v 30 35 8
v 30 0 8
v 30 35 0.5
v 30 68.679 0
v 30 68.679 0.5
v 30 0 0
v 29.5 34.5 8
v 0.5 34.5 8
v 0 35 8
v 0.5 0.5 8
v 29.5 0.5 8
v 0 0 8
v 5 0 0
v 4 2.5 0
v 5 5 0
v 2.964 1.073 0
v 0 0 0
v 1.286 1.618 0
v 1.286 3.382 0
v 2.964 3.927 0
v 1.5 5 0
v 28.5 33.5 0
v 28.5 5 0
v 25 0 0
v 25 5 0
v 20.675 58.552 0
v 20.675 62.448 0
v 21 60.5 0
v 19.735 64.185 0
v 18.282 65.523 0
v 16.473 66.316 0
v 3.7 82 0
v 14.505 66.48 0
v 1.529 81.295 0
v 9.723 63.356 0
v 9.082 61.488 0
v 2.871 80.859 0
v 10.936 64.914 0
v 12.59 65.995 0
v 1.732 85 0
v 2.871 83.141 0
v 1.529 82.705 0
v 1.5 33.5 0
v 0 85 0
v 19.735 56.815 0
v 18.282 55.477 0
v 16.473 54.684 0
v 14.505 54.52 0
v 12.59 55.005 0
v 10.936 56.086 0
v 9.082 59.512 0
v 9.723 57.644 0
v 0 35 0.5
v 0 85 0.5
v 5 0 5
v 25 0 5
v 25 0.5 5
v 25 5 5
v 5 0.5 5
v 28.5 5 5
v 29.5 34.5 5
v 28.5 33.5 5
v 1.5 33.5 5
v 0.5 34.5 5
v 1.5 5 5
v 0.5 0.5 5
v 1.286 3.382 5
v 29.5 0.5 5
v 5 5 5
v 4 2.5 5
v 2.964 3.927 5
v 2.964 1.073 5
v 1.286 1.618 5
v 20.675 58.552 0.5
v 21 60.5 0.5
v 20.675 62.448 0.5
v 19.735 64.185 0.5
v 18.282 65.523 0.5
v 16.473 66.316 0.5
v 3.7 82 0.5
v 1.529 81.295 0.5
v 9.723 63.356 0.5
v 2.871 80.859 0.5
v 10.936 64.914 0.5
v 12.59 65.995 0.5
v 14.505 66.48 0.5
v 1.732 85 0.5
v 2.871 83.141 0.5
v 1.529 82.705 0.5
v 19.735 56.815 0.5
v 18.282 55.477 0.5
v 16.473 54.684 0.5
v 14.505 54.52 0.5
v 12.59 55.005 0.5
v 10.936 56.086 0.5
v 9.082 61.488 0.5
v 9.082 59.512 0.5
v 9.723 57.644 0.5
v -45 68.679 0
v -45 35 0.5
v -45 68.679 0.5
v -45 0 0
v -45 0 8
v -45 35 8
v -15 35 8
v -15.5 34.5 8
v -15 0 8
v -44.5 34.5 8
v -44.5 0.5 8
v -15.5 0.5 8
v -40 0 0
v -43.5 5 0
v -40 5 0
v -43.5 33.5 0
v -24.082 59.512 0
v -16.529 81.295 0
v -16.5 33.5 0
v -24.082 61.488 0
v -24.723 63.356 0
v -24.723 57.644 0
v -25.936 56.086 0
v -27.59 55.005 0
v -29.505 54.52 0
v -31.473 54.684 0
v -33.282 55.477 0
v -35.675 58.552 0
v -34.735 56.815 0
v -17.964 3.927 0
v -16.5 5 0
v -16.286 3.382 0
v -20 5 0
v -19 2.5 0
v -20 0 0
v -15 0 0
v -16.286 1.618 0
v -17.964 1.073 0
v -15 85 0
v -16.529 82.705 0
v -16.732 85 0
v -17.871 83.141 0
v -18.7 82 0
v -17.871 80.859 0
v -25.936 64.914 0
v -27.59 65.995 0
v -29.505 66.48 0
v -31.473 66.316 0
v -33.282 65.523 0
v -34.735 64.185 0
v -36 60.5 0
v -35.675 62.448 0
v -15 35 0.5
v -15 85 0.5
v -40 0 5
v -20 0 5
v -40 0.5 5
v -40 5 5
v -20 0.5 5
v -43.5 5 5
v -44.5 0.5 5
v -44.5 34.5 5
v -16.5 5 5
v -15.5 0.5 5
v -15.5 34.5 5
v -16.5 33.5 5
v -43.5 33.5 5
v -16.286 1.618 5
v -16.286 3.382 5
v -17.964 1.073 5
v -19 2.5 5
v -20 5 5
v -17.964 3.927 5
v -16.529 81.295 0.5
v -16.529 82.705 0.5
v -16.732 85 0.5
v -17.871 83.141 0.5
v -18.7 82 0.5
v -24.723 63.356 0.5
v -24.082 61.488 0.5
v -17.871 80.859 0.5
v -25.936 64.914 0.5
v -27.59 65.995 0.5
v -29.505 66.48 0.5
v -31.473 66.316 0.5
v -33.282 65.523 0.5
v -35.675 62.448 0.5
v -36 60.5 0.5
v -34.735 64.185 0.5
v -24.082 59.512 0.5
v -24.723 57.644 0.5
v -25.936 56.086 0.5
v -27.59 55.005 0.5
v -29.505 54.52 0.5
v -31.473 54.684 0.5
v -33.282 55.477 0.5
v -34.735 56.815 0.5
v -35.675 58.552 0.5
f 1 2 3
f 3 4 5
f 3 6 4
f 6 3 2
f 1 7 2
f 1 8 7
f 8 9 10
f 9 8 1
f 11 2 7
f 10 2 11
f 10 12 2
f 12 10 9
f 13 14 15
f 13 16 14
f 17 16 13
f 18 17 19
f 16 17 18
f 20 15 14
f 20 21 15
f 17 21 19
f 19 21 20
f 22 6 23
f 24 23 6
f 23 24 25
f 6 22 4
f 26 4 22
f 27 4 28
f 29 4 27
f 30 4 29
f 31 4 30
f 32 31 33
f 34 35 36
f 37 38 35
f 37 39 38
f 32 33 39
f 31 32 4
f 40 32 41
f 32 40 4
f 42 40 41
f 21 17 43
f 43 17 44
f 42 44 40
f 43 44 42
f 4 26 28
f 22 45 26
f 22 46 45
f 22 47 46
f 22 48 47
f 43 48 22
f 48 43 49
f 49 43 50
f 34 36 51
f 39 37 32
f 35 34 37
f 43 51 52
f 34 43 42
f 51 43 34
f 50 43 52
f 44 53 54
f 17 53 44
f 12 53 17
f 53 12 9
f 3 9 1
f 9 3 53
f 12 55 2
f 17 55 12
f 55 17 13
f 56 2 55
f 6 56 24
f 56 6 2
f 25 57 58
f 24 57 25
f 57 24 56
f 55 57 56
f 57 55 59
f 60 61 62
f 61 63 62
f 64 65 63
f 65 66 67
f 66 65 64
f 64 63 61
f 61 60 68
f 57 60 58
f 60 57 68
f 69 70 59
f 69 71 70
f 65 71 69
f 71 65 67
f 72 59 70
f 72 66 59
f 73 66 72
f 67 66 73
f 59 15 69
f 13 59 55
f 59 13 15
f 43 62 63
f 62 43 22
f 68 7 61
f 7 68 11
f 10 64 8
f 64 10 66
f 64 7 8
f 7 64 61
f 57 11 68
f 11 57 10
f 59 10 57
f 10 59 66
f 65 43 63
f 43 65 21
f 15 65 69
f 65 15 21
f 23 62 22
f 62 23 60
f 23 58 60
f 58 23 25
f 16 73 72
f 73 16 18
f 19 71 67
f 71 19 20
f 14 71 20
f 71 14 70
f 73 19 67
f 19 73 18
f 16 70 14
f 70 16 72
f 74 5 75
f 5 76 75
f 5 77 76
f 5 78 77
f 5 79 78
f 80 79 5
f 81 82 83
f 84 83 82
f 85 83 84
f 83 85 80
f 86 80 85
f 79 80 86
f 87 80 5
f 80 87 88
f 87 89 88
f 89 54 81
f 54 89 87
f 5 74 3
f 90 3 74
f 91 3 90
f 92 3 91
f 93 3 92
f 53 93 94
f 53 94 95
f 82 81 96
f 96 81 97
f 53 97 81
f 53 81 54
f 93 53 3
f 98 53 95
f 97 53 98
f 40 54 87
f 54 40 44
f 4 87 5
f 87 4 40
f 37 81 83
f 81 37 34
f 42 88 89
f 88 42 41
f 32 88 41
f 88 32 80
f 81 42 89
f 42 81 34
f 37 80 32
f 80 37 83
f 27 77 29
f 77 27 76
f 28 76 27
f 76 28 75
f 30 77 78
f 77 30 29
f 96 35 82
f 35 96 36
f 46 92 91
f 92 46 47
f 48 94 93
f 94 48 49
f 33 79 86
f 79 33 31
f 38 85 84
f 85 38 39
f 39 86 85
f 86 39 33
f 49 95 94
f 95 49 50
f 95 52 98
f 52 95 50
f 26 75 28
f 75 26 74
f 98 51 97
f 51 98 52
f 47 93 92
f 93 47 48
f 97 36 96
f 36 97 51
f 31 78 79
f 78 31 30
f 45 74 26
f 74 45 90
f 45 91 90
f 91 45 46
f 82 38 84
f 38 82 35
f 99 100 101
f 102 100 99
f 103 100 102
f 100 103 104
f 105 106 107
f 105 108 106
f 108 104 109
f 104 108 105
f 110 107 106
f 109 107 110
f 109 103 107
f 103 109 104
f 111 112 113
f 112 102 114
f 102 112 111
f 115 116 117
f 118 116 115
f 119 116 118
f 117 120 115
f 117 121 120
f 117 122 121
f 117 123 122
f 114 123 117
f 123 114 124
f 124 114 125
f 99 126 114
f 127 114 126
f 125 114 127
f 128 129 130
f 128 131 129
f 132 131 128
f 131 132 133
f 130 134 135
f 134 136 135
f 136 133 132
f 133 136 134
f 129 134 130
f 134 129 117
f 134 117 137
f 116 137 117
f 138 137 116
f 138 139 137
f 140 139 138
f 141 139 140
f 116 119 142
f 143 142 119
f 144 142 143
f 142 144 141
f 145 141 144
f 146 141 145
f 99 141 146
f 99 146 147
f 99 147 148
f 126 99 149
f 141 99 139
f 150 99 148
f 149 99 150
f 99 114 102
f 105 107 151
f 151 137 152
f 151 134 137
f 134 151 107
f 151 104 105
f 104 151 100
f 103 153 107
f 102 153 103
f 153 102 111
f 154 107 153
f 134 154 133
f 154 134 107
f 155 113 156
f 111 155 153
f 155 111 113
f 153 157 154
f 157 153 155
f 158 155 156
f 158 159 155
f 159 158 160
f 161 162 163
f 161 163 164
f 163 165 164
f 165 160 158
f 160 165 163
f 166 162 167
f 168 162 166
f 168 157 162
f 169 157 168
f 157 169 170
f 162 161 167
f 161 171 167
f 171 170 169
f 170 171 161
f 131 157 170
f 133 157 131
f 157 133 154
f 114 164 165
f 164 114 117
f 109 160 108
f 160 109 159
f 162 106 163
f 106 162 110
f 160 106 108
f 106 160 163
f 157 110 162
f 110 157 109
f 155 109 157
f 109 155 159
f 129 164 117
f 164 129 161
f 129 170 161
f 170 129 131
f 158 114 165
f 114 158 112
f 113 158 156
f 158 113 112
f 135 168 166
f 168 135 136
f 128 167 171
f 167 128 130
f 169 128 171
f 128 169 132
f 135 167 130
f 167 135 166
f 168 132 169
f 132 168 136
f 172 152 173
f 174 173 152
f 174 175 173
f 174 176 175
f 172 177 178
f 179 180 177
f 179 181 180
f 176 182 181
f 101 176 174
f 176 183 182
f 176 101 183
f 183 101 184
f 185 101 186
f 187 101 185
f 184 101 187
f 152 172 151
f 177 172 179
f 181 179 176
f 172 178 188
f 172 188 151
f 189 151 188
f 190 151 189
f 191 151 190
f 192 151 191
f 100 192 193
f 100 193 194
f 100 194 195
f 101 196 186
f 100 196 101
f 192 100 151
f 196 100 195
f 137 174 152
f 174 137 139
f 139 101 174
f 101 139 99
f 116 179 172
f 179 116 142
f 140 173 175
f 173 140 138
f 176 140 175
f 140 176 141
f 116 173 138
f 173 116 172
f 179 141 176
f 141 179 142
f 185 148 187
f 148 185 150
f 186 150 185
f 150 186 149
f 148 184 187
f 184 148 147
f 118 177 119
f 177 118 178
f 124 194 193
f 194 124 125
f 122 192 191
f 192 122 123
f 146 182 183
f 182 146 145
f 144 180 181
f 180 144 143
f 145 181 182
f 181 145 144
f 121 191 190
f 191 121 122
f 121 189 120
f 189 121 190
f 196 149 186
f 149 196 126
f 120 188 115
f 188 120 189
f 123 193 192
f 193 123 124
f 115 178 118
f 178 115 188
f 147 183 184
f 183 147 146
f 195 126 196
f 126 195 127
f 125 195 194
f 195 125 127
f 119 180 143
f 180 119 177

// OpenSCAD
/* Copyright 2024
 * Dale Rogerson
 *
 * This program is free software: you can redistribute it and/or modify
 * it under the terms of the GNU General Public License as published by
 * the Free Software Foundation, either version 2 of the License, or
 * (at your option) any later version.
 *
 * This program is distributed in the hope that it will be useful,
 * but WITHOUT ANY WARRANTY; without even the implied warranty of
 * MERCHANTABILITY or FITNESS FOR A PARTICULAR PURPOSE.  See the
 * GNU General Public License for more details.
 *
 * You should have received a copy of the GNU General Public License
 * along with this program.  If not, see <http://www.gnu.org/licenses/>.
 */


//---  Top plate
module topPlate() {
    linear_extrude(height = 1.5)
    import("top-thisIsSwitchPlate.svg");
}

// --- This mcu cover has a top on it and is the same height down the keyboard. I did not use
module mcuCover() {
     difference() {
        cube([30, 85, 5]); // main body
        translate([5, 0, 0]) cube([20, 60, 4]); // main hollow out
        translate([5, 0, 0]) cube([15, 70.75, 4]); // back middle hollow out
        translate([2, 7, 0]) cube([10, 71, 4]); // left wider hollow out
        translate([20, 7, 0]) cube([8, 60, 4]); // right wider hollow out
      
     color("green")
        translate([0, 86, 0])
            rotate([0, 0, -30])
                cube([40, 40, 5]); // trim end
    color("green") // front hole
        translate([2.5, 2.5, -5]) cylinder(h = 10, r = 1.2);
    color("green") // back hole
        translate([2.5, 2.5+79.5, -5]) cylinder(h = 10, r = 1.2);

    color("green") // light hole
        translate([10, 2.5, -5]) cylinder(h = 15, r = 1.2);
    color("green") // light hole
        translate([20, 2.5, -5]) cylinder(h = 15, r = 1.2);
    }
}


/* Uncomment these lines to use this alternative cover.
translate([5, 0, 5])
    rotate([0, 180, 0])
        mirror([1, 0, 0])
            mcuCover();
 

translate([-5, 0, 5])
    rotate([0, 180, 0])
        mcuCover();
*/  

topPlateHeight = 3.0;

mcuClearance = 5;
coverHeight = mcuClearance + topPlateHeight;

coverWidth = 30;
// coverLength = 52;

lipWidth = 0.5;
  
wideWallWidth = 5;
thinWallWidth = 1.5;

postOffset = 5;

//--- Make a cover that has minimal height and an opening to see MCU.
module mcuCoverTopless(CoverLength) {
    //  Front
    difference() {
        cube([coverWidth, CoverLength, coverHeight]); // front body
        
        translate([wideWallWidth, 0, 0])
            cube([coverWidth-wideWallWidth*2, CoverLength-thinWallWidth, mcuClearance]); // main hollow out
        
        translate([lipWidth, lipWidth, mcuClearance])
            cube([coverWidth-lipWidth*2, CoverLength-lipWidth*2, topPlateHeight]); // remove top

        translate([thinWallWidth, postOffset, 0])
            cube([5, CoverLength-thinWallWidth-postOffset, coverHeight]); // make outside wall narrower
            
        translate([coverWidth-postOffset-thinWallWidth, postOffset, 0])
            cube([5, CoverLength-thinWallWidth-postOffset, coverHeight]); // make inside wall narrower                
                
    color("green") // front hole for screw/support
        translate([2.5, 2.5, -5]) cylinder(h = 10, r = 1.5);

    }
    
    //  Back half
    difference() {
        color("blue") translate([0, CoverLength, 0]) cube([30, 52-CoverLength+33, .5]); // front body
        
      
     color("green")
        translate([0, 86, 0])
            rotate([0, 0, -30])
                cube([40, 40, 5]); // trim end

     color("green") // back hole
        translate([2.5, 2.5+79.5, -5]) cylinder(h = 10, r = 1.2);
                
    }
}


// --- Covers the hole in the top plate.
//
//     This can be cut on a laser cutter instead of 3D printed which is what I did.
module topInsert(CoverLength) {

    difference() {
        translate([lipWidth, lipWidth, mcuClearance])
            cube([coverWidth-lipWidth*2, CoverLength-lipWidth*2, topPlateHeight]); // remove top
        
        color("green") // front hole
            translate([2.5, 2.5, -5]) cylinder(h = 10, r = 1.2);
    }
};

coverLength = 52;

//
// These print without the holes for the encoder. 
//

// Left Cover
//mcuCoverTopless(coverLength);

// Right Cover
//translate([-coverWidth/2, 0, 0]) mirror([1, 0, 0]) mcuCoverTopless(coverLength);

// If you don't want to do that you can uncomment these lines and cover the hole in the
// MCU cover. You will need to adjust it to get it to work for both right and left covers and
// add screw holes.
// color("green") topInsert(coverLength); // This covers the hole in the mcu cover


coverLengthWithEncoder = 35;

module mcuCoverToplessEncoder() {
    difference() {
        mcuCoverTopless(coverLengthWithEncoder);

        // This is the hole for the encoder to poke through.
        color("green") // front hole
            translate([coverWidth/2, 60.5, -5]) cylinder(h = 10, r = 6);
    }        
}

//
// These print with the hole for the encoder. If you aren't using the encoder. Look above.
//

// Left cover
mcuCoverToplessEncoder();

// Right cover
translate([-coverWidth/2, 0, 0]) mirror([1, 0, 0]) mcuCoverToplessEncoder();

// I put clear or smokey arcylic over the MCU so that I can see it. Looks really cool.
// If you don't want to do that you can uncomment these lines and cover the hole in the
// MCU cover. You will need to adjust it to get it to work for both right and left covers
// and add screw holes.
// color("green") topInsert(coverLengthWithEncoder); // This covers the hole in the mcu cover


// put switch plate down to align the hole in the encoder.
/*
translate([-10, 114, 0]) {
    mirror([0, 1, 0]) {
        topPlate();
    }
 } 
 */
     
 
